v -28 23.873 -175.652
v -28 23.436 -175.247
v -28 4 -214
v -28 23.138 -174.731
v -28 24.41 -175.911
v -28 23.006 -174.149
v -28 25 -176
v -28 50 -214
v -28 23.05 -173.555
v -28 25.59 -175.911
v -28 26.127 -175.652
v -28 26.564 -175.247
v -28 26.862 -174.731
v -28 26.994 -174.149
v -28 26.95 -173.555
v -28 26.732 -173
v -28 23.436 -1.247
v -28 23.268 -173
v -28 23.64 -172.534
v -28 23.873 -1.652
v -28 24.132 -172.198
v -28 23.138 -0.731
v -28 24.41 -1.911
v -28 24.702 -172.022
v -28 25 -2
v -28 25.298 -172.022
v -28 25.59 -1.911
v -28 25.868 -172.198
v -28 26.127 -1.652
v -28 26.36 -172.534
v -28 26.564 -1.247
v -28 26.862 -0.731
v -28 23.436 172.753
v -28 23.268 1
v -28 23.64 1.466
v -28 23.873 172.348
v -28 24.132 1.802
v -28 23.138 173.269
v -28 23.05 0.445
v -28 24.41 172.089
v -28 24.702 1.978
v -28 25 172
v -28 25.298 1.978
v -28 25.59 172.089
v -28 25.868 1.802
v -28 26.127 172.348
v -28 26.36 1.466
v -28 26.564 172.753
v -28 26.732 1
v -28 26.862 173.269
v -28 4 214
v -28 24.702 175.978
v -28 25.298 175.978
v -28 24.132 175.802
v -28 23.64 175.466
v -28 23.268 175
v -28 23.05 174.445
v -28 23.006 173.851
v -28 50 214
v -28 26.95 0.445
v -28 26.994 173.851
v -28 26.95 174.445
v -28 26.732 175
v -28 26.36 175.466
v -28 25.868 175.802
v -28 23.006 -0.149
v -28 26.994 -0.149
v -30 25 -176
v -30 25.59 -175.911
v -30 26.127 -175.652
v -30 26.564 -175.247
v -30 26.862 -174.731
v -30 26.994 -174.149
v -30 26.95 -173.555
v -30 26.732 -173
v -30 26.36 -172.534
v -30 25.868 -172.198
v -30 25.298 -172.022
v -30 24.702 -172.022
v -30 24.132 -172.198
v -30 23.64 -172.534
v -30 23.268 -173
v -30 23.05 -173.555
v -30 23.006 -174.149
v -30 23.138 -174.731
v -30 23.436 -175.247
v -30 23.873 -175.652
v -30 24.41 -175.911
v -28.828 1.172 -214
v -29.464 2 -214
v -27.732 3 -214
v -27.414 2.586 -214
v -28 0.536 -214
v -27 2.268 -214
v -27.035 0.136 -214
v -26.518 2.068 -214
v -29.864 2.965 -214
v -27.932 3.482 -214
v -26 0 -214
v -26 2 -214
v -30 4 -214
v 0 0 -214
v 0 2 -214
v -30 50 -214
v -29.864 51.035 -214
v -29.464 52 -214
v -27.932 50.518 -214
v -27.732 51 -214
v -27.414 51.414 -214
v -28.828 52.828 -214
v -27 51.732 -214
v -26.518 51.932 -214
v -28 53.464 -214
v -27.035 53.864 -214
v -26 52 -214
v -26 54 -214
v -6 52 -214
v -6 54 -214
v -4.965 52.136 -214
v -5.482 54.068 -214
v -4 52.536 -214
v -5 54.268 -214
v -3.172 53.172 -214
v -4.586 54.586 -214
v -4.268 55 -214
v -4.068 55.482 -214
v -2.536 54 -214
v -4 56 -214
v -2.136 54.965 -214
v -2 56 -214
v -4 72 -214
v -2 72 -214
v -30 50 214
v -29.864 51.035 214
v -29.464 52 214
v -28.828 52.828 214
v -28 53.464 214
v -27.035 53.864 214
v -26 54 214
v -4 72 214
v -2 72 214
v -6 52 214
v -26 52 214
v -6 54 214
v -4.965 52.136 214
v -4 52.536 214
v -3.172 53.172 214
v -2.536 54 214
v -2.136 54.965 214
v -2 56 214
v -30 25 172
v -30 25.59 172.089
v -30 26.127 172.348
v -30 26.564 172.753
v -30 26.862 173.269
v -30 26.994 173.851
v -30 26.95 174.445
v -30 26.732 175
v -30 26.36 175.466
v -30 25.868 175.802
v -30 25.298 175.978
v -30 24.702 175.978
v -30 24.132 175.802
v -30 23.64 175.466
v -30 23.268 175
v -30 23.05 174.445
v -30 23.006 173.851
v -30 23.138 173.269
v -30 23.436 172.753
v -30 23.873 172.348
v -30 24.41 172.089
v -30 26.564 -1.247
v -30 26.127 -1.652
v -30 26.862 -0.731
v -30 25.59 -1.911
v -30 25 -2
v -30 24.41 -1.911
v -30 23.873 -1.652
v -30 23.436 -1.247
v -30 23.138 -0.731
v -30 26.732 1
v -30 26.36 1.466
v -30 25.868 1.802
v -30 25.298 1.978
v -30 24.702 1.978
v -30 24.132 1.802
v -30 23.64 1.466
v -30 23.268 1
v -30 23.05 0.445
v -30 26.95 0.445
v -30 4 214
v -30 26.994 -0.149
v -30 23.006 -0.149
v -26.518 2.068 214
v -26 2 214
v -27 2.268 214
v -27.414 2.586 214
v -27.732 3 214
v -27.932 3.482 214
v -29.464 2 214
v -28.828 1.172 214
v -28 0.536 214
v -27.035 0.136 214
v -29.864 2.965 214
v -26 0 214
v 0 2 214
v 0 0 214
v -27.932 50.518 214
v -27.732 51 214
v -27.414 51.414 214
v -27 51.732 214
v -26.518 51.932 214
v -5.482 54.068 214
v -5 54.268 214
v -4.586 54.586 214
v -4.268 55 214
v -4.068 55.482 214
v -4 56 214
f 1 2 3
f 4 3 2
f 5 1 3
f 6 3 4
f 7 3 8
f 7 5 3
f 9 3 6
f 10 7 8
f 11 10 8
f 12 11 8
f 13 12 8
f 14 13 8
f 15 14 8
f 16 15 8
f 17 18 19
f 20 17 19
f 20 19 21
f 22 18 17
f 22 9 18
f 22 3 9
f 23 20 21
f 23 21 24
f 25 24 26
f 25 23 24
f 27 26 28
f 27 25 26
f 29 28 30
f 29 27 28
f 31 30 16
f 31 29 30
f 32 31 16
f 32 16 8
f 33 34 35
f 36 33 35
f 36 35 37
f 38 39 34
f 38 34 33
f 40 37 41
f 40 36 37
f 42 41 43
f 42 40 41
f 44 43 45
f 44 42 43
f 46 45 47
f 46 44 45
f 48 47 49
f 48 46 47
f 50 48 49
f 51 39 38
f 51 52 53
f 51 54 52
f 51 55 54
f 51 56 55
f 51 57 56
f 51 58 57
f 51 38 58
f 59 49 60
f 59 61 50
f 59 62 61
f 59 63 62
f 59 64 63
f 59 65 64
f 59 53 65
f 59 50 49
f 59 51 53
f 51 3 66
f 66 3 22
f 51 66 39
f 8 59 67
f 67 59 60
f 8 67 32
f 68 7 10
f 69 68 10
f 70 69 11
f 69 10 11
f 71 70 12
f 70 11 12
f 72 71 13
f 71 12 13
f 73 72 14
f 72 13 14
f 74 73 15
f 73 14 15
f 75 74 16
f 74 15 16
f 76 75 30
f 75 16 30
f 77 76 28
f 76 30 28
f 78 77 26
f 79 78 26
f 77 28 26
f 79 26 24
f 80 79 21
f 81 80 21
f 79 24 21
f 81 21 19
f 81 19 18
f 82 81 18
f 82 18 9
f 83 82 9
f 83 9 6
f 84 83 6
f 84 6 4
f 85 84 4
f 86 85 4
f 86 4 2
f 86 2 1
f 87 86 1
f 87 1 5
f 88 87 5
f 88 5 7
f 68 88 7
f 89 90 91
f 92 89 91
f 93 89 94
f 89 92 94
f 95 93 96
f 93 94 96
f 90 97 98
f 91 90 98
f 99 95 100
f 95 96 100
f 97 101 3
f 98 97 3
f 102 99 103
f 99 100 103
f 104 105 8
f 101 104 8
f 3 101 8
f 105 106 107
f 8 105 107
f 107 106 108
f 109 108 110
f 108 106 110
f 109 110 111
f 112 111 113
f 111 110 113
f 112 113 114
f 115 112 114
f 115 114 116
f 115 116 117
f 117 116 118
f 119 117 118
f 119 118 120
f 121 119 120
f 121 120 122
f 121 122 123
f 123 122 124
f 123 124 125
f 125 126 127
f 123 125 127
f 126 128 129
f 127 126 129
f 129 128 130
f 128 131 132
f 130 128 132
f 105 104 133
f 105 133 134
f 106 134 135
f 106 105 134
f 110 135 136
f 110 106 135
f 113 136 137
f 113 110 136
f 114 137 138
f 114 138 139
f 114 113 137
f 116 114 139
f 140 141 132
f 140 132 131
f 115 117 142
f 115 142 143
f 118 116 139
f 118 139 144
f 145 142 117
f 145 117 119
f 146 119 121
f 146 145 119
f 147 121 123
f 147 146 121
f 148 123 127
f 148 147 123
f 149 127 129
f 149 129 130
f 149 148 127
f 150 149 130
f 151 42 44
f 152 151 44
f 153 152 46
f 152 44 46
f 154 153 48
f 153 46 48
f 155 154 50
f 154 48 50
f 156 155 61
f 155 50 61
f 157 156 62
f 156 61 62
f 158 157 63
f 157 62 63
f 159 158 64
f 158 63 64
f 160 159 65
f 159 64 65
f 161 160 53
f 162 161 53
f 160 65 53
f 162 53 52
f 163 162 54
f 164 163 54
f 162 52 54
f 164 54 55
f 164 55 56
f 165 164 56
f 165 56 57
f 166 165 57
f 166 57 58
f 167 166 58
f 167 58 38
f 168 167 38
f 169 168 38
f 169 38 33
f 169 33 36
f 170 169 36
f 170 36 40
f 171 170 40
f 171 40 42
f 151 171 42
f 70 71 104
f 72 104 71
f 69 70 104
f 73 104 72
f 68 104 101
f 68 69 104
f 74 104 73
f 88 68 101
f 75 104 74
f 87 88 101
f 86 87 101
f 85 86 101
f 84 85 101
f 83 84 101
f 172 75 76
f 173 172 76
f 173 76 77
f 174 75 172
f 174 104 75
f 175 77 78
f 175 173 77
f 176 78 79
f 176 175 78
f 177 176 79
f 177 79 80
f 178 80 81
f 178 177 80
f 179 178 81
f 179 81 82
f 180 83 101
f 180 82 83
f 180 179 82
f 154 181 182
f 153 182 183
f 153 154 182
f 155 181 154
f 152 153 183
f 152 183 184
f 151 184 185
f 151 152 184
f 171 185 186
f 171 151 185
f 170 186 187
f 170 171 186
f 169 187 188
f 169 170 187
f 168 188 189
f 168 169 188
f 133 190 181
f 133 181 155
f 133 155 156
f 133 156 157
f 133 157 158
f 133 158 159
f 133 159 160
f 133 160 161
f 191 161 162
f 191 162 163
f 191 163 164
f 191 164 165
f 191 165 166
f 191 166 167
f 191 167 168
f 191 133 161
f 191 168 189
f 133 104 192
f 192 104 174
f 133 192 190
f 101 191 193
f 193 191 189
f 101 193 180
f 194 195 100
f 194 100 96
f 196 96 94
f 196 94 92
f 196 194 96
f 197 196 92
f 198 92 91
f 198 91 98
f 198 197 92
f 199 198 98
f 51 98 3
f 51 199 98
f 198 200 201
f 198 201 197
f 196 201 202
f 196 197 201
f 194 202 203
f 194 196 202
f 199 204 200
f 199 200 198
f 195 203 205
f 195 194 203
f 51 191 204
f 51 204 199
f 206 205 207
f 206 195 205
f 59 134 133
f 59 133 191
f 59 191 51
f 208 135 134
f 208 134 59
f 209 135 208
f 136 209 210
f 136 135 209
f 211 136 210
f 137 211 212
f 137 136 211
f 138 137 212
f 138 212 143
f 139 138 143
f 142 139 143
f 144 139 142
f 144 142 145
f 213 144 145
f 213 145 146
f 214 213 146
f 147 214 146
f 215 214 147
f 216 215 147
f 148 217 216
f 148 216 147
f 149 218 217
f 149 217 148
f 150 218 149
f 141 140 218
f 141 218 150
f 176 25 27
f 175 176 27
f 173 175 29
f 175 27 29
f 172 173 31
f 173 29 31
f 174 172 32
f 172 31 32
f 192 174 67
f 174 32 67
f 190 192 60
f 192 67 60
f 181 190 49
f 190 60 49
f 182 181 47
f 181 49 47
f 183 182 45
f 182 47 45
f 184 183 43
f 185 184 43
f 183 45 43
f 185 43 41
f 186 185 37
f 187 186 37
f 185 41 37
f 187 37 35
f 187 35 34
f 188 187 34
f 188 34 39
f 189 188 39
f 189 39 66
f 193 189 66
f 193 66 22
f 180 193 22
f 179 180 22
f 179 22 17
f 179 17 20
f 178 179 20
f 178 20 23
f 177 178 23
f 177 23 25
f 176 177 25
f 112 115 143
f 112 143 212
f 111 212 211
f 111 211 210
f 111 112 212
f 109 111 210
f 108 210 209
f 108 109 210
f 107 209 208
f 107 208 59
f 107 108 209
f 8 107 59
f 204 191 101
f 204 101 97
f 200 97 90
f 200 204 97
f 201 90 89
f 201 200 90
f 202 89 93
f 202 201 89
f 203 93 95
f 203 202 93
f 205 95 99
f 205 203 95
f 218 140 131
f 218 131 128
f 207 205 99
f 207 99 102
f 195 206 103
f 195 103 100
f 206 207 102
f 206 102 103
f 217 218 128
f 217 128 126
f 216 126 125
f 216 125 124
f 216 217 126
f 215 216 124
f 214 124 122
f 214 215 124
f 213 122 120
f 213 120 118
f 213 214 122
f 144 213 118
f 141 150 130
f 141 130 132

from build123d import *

# Parameters (mm, degrees)
BASE_FLANGE1_DEPTH           = 214
EDGE_FLANGE1_STRIP_W         = 12
EDGE_FLANGE1_STRIP_H         = 2
EDGE_FLANGE1_STRIP_CUT_DEPTH = 428
EDGE_FLANGE1_DEPTH           = 428
EDGE_FLANGE2_STRIP_W         = 12
EDGE_FLANGE2_STRIP_H         = 2
EDGE_FLANGE2_STRIP_CUT_DEPTH = 428
EDGE_FLANGE2_DEPTH           = 428
SKETCH6_R                    = 2
CUT_EXTRUDE2_DEPTH           = 10
LPATTERN3_COUNT              = 3
LPATTERN3_PITCH              = 174


# Sheet-metal steps are written as plain solids
with BuildPart() as part:
    # Sketch2 → Base-Flange1 (new, symmetric)
    with BuildSketch(Plane.XY):
        with BuildLine():
            Line((-30, 54), (-30, 4))
            ThreePointArc((-30, 4), (-28.828427125, 1.171572875), (-26, 0))
            Line((-26, 0), (0, 0))
            Line((0, 0), (0, 2))
            Line((0, 2), (-26, 2))
            ThreePointArc((-26, 2), (-27.414213562, 2.585786438), (-28, 4))
            Line((-28, 4), (-28, 54))
            Line((-28, 54), (-30, 54))
        make_face()
    extrude(amount=BASE_FLANGE1_DEPTH, both=True)

    # Edge-Flange1 strip (across the edge) → Edge-Flange1 strip cut (cut)
    with BuildSketch(Plane(origin=(-28, 54, -214), x_dir=(0, -1, 0), z_dir=(0, 0, 1))):
        with Locations((-2, -1)):
            Rectangle(EDGE_FLANGE1_STRIP_W, EDGE_FLANGE1_STRIP_H)
    extrude(amount=EDGE_FLANGE1_STRIP_CUT_DEPTH, mode=Mode.SUBTRACT)

    # Edge-Flange1 section (across the edge) → Edge-Flange1 (add)
    with BuildSketch(Plane(origin=(-28, 54, -214), x_dir=(0, -1, 0), z_dir=(0, 0, 1))):
        with BuildLine():
            Line((0, 2), (0, 26))
            Line((0, 26), (2, 26))
            Line((2, 26), (2, 2))
            ThreePointArc((2, 2), (2.585786438, 0.585786438), (4, 0))
            Line((4, 0), (4, -2))
            ThreePointArc((4, -2), (1.171572875, -0.828427125), (0, 2))
        make_face()
    extrude(amount=EDGE_FLANGE1_DEPTH)

    # Edge-Flange2 strip (across the edge) → Edge-Flange2 strip cut (cut)
    with BuildSketch(Plane(origin=(-2, 54, 214), x_dir=(-1, 0, 0), z_dir=(0, 0, -1))):
        with Locations((-2, -1)):
            Rectangle(EDGE_FLANGE2_STRIP_W, EDGE_FLANGE2_STRIP_H)
    extrude(amount=EDGE_FLANGE2_STRIP_CUT_DEPTH, mode=Mode.SUBTRACT)

    # Edge-Flange2 section (across the edge) → Edge-Flange2 (add)
    with BuildSketch(Plane(origin=(-2, 54, 214), x_dir=(-1, 0, 0), z_dir=(0, 0, -1))):
        with BuildLine():
            Line((0, 2), (0, 18))
            Line((0, 18), (2, 18))
            Line((2, 18), (2, 2))
            ThreePointArc((2, 2), (2.585786438, 0.585786438), (4, 0))
            Line((4, 0), (4, -2))
            ThreePointArc((4, -2), (1.171572875, -0.828427125), (0, 2))
        make_face()
    extrude(amount=EDGE_FLANGE2_DEPTH)

    # Sketch6 → Cut-Extrude2 (cut)
    with BuildSketch(Plane(origin=(-28, 0, 0), x_dir=(0, 0, -1), z_dir=(1, 0, 0))):
        with Locations((174, 25)):
            Circle(SKETCH6_R)
    cut_extrude2 = extrude(amount=-CUT_EXTRUDE2_DEPTH, mode=Mode.SUBTRACT)

    # LPattern3: Cut-Extrude2 ×3
    with Locations(*[(0, 0, i * LPATTERN3_PITCH) for i in range(1, LPATTERN3_COUNT)]):
        add(cut_extrude2, mode=Mode.SUBTRACT)


solid = part.part
